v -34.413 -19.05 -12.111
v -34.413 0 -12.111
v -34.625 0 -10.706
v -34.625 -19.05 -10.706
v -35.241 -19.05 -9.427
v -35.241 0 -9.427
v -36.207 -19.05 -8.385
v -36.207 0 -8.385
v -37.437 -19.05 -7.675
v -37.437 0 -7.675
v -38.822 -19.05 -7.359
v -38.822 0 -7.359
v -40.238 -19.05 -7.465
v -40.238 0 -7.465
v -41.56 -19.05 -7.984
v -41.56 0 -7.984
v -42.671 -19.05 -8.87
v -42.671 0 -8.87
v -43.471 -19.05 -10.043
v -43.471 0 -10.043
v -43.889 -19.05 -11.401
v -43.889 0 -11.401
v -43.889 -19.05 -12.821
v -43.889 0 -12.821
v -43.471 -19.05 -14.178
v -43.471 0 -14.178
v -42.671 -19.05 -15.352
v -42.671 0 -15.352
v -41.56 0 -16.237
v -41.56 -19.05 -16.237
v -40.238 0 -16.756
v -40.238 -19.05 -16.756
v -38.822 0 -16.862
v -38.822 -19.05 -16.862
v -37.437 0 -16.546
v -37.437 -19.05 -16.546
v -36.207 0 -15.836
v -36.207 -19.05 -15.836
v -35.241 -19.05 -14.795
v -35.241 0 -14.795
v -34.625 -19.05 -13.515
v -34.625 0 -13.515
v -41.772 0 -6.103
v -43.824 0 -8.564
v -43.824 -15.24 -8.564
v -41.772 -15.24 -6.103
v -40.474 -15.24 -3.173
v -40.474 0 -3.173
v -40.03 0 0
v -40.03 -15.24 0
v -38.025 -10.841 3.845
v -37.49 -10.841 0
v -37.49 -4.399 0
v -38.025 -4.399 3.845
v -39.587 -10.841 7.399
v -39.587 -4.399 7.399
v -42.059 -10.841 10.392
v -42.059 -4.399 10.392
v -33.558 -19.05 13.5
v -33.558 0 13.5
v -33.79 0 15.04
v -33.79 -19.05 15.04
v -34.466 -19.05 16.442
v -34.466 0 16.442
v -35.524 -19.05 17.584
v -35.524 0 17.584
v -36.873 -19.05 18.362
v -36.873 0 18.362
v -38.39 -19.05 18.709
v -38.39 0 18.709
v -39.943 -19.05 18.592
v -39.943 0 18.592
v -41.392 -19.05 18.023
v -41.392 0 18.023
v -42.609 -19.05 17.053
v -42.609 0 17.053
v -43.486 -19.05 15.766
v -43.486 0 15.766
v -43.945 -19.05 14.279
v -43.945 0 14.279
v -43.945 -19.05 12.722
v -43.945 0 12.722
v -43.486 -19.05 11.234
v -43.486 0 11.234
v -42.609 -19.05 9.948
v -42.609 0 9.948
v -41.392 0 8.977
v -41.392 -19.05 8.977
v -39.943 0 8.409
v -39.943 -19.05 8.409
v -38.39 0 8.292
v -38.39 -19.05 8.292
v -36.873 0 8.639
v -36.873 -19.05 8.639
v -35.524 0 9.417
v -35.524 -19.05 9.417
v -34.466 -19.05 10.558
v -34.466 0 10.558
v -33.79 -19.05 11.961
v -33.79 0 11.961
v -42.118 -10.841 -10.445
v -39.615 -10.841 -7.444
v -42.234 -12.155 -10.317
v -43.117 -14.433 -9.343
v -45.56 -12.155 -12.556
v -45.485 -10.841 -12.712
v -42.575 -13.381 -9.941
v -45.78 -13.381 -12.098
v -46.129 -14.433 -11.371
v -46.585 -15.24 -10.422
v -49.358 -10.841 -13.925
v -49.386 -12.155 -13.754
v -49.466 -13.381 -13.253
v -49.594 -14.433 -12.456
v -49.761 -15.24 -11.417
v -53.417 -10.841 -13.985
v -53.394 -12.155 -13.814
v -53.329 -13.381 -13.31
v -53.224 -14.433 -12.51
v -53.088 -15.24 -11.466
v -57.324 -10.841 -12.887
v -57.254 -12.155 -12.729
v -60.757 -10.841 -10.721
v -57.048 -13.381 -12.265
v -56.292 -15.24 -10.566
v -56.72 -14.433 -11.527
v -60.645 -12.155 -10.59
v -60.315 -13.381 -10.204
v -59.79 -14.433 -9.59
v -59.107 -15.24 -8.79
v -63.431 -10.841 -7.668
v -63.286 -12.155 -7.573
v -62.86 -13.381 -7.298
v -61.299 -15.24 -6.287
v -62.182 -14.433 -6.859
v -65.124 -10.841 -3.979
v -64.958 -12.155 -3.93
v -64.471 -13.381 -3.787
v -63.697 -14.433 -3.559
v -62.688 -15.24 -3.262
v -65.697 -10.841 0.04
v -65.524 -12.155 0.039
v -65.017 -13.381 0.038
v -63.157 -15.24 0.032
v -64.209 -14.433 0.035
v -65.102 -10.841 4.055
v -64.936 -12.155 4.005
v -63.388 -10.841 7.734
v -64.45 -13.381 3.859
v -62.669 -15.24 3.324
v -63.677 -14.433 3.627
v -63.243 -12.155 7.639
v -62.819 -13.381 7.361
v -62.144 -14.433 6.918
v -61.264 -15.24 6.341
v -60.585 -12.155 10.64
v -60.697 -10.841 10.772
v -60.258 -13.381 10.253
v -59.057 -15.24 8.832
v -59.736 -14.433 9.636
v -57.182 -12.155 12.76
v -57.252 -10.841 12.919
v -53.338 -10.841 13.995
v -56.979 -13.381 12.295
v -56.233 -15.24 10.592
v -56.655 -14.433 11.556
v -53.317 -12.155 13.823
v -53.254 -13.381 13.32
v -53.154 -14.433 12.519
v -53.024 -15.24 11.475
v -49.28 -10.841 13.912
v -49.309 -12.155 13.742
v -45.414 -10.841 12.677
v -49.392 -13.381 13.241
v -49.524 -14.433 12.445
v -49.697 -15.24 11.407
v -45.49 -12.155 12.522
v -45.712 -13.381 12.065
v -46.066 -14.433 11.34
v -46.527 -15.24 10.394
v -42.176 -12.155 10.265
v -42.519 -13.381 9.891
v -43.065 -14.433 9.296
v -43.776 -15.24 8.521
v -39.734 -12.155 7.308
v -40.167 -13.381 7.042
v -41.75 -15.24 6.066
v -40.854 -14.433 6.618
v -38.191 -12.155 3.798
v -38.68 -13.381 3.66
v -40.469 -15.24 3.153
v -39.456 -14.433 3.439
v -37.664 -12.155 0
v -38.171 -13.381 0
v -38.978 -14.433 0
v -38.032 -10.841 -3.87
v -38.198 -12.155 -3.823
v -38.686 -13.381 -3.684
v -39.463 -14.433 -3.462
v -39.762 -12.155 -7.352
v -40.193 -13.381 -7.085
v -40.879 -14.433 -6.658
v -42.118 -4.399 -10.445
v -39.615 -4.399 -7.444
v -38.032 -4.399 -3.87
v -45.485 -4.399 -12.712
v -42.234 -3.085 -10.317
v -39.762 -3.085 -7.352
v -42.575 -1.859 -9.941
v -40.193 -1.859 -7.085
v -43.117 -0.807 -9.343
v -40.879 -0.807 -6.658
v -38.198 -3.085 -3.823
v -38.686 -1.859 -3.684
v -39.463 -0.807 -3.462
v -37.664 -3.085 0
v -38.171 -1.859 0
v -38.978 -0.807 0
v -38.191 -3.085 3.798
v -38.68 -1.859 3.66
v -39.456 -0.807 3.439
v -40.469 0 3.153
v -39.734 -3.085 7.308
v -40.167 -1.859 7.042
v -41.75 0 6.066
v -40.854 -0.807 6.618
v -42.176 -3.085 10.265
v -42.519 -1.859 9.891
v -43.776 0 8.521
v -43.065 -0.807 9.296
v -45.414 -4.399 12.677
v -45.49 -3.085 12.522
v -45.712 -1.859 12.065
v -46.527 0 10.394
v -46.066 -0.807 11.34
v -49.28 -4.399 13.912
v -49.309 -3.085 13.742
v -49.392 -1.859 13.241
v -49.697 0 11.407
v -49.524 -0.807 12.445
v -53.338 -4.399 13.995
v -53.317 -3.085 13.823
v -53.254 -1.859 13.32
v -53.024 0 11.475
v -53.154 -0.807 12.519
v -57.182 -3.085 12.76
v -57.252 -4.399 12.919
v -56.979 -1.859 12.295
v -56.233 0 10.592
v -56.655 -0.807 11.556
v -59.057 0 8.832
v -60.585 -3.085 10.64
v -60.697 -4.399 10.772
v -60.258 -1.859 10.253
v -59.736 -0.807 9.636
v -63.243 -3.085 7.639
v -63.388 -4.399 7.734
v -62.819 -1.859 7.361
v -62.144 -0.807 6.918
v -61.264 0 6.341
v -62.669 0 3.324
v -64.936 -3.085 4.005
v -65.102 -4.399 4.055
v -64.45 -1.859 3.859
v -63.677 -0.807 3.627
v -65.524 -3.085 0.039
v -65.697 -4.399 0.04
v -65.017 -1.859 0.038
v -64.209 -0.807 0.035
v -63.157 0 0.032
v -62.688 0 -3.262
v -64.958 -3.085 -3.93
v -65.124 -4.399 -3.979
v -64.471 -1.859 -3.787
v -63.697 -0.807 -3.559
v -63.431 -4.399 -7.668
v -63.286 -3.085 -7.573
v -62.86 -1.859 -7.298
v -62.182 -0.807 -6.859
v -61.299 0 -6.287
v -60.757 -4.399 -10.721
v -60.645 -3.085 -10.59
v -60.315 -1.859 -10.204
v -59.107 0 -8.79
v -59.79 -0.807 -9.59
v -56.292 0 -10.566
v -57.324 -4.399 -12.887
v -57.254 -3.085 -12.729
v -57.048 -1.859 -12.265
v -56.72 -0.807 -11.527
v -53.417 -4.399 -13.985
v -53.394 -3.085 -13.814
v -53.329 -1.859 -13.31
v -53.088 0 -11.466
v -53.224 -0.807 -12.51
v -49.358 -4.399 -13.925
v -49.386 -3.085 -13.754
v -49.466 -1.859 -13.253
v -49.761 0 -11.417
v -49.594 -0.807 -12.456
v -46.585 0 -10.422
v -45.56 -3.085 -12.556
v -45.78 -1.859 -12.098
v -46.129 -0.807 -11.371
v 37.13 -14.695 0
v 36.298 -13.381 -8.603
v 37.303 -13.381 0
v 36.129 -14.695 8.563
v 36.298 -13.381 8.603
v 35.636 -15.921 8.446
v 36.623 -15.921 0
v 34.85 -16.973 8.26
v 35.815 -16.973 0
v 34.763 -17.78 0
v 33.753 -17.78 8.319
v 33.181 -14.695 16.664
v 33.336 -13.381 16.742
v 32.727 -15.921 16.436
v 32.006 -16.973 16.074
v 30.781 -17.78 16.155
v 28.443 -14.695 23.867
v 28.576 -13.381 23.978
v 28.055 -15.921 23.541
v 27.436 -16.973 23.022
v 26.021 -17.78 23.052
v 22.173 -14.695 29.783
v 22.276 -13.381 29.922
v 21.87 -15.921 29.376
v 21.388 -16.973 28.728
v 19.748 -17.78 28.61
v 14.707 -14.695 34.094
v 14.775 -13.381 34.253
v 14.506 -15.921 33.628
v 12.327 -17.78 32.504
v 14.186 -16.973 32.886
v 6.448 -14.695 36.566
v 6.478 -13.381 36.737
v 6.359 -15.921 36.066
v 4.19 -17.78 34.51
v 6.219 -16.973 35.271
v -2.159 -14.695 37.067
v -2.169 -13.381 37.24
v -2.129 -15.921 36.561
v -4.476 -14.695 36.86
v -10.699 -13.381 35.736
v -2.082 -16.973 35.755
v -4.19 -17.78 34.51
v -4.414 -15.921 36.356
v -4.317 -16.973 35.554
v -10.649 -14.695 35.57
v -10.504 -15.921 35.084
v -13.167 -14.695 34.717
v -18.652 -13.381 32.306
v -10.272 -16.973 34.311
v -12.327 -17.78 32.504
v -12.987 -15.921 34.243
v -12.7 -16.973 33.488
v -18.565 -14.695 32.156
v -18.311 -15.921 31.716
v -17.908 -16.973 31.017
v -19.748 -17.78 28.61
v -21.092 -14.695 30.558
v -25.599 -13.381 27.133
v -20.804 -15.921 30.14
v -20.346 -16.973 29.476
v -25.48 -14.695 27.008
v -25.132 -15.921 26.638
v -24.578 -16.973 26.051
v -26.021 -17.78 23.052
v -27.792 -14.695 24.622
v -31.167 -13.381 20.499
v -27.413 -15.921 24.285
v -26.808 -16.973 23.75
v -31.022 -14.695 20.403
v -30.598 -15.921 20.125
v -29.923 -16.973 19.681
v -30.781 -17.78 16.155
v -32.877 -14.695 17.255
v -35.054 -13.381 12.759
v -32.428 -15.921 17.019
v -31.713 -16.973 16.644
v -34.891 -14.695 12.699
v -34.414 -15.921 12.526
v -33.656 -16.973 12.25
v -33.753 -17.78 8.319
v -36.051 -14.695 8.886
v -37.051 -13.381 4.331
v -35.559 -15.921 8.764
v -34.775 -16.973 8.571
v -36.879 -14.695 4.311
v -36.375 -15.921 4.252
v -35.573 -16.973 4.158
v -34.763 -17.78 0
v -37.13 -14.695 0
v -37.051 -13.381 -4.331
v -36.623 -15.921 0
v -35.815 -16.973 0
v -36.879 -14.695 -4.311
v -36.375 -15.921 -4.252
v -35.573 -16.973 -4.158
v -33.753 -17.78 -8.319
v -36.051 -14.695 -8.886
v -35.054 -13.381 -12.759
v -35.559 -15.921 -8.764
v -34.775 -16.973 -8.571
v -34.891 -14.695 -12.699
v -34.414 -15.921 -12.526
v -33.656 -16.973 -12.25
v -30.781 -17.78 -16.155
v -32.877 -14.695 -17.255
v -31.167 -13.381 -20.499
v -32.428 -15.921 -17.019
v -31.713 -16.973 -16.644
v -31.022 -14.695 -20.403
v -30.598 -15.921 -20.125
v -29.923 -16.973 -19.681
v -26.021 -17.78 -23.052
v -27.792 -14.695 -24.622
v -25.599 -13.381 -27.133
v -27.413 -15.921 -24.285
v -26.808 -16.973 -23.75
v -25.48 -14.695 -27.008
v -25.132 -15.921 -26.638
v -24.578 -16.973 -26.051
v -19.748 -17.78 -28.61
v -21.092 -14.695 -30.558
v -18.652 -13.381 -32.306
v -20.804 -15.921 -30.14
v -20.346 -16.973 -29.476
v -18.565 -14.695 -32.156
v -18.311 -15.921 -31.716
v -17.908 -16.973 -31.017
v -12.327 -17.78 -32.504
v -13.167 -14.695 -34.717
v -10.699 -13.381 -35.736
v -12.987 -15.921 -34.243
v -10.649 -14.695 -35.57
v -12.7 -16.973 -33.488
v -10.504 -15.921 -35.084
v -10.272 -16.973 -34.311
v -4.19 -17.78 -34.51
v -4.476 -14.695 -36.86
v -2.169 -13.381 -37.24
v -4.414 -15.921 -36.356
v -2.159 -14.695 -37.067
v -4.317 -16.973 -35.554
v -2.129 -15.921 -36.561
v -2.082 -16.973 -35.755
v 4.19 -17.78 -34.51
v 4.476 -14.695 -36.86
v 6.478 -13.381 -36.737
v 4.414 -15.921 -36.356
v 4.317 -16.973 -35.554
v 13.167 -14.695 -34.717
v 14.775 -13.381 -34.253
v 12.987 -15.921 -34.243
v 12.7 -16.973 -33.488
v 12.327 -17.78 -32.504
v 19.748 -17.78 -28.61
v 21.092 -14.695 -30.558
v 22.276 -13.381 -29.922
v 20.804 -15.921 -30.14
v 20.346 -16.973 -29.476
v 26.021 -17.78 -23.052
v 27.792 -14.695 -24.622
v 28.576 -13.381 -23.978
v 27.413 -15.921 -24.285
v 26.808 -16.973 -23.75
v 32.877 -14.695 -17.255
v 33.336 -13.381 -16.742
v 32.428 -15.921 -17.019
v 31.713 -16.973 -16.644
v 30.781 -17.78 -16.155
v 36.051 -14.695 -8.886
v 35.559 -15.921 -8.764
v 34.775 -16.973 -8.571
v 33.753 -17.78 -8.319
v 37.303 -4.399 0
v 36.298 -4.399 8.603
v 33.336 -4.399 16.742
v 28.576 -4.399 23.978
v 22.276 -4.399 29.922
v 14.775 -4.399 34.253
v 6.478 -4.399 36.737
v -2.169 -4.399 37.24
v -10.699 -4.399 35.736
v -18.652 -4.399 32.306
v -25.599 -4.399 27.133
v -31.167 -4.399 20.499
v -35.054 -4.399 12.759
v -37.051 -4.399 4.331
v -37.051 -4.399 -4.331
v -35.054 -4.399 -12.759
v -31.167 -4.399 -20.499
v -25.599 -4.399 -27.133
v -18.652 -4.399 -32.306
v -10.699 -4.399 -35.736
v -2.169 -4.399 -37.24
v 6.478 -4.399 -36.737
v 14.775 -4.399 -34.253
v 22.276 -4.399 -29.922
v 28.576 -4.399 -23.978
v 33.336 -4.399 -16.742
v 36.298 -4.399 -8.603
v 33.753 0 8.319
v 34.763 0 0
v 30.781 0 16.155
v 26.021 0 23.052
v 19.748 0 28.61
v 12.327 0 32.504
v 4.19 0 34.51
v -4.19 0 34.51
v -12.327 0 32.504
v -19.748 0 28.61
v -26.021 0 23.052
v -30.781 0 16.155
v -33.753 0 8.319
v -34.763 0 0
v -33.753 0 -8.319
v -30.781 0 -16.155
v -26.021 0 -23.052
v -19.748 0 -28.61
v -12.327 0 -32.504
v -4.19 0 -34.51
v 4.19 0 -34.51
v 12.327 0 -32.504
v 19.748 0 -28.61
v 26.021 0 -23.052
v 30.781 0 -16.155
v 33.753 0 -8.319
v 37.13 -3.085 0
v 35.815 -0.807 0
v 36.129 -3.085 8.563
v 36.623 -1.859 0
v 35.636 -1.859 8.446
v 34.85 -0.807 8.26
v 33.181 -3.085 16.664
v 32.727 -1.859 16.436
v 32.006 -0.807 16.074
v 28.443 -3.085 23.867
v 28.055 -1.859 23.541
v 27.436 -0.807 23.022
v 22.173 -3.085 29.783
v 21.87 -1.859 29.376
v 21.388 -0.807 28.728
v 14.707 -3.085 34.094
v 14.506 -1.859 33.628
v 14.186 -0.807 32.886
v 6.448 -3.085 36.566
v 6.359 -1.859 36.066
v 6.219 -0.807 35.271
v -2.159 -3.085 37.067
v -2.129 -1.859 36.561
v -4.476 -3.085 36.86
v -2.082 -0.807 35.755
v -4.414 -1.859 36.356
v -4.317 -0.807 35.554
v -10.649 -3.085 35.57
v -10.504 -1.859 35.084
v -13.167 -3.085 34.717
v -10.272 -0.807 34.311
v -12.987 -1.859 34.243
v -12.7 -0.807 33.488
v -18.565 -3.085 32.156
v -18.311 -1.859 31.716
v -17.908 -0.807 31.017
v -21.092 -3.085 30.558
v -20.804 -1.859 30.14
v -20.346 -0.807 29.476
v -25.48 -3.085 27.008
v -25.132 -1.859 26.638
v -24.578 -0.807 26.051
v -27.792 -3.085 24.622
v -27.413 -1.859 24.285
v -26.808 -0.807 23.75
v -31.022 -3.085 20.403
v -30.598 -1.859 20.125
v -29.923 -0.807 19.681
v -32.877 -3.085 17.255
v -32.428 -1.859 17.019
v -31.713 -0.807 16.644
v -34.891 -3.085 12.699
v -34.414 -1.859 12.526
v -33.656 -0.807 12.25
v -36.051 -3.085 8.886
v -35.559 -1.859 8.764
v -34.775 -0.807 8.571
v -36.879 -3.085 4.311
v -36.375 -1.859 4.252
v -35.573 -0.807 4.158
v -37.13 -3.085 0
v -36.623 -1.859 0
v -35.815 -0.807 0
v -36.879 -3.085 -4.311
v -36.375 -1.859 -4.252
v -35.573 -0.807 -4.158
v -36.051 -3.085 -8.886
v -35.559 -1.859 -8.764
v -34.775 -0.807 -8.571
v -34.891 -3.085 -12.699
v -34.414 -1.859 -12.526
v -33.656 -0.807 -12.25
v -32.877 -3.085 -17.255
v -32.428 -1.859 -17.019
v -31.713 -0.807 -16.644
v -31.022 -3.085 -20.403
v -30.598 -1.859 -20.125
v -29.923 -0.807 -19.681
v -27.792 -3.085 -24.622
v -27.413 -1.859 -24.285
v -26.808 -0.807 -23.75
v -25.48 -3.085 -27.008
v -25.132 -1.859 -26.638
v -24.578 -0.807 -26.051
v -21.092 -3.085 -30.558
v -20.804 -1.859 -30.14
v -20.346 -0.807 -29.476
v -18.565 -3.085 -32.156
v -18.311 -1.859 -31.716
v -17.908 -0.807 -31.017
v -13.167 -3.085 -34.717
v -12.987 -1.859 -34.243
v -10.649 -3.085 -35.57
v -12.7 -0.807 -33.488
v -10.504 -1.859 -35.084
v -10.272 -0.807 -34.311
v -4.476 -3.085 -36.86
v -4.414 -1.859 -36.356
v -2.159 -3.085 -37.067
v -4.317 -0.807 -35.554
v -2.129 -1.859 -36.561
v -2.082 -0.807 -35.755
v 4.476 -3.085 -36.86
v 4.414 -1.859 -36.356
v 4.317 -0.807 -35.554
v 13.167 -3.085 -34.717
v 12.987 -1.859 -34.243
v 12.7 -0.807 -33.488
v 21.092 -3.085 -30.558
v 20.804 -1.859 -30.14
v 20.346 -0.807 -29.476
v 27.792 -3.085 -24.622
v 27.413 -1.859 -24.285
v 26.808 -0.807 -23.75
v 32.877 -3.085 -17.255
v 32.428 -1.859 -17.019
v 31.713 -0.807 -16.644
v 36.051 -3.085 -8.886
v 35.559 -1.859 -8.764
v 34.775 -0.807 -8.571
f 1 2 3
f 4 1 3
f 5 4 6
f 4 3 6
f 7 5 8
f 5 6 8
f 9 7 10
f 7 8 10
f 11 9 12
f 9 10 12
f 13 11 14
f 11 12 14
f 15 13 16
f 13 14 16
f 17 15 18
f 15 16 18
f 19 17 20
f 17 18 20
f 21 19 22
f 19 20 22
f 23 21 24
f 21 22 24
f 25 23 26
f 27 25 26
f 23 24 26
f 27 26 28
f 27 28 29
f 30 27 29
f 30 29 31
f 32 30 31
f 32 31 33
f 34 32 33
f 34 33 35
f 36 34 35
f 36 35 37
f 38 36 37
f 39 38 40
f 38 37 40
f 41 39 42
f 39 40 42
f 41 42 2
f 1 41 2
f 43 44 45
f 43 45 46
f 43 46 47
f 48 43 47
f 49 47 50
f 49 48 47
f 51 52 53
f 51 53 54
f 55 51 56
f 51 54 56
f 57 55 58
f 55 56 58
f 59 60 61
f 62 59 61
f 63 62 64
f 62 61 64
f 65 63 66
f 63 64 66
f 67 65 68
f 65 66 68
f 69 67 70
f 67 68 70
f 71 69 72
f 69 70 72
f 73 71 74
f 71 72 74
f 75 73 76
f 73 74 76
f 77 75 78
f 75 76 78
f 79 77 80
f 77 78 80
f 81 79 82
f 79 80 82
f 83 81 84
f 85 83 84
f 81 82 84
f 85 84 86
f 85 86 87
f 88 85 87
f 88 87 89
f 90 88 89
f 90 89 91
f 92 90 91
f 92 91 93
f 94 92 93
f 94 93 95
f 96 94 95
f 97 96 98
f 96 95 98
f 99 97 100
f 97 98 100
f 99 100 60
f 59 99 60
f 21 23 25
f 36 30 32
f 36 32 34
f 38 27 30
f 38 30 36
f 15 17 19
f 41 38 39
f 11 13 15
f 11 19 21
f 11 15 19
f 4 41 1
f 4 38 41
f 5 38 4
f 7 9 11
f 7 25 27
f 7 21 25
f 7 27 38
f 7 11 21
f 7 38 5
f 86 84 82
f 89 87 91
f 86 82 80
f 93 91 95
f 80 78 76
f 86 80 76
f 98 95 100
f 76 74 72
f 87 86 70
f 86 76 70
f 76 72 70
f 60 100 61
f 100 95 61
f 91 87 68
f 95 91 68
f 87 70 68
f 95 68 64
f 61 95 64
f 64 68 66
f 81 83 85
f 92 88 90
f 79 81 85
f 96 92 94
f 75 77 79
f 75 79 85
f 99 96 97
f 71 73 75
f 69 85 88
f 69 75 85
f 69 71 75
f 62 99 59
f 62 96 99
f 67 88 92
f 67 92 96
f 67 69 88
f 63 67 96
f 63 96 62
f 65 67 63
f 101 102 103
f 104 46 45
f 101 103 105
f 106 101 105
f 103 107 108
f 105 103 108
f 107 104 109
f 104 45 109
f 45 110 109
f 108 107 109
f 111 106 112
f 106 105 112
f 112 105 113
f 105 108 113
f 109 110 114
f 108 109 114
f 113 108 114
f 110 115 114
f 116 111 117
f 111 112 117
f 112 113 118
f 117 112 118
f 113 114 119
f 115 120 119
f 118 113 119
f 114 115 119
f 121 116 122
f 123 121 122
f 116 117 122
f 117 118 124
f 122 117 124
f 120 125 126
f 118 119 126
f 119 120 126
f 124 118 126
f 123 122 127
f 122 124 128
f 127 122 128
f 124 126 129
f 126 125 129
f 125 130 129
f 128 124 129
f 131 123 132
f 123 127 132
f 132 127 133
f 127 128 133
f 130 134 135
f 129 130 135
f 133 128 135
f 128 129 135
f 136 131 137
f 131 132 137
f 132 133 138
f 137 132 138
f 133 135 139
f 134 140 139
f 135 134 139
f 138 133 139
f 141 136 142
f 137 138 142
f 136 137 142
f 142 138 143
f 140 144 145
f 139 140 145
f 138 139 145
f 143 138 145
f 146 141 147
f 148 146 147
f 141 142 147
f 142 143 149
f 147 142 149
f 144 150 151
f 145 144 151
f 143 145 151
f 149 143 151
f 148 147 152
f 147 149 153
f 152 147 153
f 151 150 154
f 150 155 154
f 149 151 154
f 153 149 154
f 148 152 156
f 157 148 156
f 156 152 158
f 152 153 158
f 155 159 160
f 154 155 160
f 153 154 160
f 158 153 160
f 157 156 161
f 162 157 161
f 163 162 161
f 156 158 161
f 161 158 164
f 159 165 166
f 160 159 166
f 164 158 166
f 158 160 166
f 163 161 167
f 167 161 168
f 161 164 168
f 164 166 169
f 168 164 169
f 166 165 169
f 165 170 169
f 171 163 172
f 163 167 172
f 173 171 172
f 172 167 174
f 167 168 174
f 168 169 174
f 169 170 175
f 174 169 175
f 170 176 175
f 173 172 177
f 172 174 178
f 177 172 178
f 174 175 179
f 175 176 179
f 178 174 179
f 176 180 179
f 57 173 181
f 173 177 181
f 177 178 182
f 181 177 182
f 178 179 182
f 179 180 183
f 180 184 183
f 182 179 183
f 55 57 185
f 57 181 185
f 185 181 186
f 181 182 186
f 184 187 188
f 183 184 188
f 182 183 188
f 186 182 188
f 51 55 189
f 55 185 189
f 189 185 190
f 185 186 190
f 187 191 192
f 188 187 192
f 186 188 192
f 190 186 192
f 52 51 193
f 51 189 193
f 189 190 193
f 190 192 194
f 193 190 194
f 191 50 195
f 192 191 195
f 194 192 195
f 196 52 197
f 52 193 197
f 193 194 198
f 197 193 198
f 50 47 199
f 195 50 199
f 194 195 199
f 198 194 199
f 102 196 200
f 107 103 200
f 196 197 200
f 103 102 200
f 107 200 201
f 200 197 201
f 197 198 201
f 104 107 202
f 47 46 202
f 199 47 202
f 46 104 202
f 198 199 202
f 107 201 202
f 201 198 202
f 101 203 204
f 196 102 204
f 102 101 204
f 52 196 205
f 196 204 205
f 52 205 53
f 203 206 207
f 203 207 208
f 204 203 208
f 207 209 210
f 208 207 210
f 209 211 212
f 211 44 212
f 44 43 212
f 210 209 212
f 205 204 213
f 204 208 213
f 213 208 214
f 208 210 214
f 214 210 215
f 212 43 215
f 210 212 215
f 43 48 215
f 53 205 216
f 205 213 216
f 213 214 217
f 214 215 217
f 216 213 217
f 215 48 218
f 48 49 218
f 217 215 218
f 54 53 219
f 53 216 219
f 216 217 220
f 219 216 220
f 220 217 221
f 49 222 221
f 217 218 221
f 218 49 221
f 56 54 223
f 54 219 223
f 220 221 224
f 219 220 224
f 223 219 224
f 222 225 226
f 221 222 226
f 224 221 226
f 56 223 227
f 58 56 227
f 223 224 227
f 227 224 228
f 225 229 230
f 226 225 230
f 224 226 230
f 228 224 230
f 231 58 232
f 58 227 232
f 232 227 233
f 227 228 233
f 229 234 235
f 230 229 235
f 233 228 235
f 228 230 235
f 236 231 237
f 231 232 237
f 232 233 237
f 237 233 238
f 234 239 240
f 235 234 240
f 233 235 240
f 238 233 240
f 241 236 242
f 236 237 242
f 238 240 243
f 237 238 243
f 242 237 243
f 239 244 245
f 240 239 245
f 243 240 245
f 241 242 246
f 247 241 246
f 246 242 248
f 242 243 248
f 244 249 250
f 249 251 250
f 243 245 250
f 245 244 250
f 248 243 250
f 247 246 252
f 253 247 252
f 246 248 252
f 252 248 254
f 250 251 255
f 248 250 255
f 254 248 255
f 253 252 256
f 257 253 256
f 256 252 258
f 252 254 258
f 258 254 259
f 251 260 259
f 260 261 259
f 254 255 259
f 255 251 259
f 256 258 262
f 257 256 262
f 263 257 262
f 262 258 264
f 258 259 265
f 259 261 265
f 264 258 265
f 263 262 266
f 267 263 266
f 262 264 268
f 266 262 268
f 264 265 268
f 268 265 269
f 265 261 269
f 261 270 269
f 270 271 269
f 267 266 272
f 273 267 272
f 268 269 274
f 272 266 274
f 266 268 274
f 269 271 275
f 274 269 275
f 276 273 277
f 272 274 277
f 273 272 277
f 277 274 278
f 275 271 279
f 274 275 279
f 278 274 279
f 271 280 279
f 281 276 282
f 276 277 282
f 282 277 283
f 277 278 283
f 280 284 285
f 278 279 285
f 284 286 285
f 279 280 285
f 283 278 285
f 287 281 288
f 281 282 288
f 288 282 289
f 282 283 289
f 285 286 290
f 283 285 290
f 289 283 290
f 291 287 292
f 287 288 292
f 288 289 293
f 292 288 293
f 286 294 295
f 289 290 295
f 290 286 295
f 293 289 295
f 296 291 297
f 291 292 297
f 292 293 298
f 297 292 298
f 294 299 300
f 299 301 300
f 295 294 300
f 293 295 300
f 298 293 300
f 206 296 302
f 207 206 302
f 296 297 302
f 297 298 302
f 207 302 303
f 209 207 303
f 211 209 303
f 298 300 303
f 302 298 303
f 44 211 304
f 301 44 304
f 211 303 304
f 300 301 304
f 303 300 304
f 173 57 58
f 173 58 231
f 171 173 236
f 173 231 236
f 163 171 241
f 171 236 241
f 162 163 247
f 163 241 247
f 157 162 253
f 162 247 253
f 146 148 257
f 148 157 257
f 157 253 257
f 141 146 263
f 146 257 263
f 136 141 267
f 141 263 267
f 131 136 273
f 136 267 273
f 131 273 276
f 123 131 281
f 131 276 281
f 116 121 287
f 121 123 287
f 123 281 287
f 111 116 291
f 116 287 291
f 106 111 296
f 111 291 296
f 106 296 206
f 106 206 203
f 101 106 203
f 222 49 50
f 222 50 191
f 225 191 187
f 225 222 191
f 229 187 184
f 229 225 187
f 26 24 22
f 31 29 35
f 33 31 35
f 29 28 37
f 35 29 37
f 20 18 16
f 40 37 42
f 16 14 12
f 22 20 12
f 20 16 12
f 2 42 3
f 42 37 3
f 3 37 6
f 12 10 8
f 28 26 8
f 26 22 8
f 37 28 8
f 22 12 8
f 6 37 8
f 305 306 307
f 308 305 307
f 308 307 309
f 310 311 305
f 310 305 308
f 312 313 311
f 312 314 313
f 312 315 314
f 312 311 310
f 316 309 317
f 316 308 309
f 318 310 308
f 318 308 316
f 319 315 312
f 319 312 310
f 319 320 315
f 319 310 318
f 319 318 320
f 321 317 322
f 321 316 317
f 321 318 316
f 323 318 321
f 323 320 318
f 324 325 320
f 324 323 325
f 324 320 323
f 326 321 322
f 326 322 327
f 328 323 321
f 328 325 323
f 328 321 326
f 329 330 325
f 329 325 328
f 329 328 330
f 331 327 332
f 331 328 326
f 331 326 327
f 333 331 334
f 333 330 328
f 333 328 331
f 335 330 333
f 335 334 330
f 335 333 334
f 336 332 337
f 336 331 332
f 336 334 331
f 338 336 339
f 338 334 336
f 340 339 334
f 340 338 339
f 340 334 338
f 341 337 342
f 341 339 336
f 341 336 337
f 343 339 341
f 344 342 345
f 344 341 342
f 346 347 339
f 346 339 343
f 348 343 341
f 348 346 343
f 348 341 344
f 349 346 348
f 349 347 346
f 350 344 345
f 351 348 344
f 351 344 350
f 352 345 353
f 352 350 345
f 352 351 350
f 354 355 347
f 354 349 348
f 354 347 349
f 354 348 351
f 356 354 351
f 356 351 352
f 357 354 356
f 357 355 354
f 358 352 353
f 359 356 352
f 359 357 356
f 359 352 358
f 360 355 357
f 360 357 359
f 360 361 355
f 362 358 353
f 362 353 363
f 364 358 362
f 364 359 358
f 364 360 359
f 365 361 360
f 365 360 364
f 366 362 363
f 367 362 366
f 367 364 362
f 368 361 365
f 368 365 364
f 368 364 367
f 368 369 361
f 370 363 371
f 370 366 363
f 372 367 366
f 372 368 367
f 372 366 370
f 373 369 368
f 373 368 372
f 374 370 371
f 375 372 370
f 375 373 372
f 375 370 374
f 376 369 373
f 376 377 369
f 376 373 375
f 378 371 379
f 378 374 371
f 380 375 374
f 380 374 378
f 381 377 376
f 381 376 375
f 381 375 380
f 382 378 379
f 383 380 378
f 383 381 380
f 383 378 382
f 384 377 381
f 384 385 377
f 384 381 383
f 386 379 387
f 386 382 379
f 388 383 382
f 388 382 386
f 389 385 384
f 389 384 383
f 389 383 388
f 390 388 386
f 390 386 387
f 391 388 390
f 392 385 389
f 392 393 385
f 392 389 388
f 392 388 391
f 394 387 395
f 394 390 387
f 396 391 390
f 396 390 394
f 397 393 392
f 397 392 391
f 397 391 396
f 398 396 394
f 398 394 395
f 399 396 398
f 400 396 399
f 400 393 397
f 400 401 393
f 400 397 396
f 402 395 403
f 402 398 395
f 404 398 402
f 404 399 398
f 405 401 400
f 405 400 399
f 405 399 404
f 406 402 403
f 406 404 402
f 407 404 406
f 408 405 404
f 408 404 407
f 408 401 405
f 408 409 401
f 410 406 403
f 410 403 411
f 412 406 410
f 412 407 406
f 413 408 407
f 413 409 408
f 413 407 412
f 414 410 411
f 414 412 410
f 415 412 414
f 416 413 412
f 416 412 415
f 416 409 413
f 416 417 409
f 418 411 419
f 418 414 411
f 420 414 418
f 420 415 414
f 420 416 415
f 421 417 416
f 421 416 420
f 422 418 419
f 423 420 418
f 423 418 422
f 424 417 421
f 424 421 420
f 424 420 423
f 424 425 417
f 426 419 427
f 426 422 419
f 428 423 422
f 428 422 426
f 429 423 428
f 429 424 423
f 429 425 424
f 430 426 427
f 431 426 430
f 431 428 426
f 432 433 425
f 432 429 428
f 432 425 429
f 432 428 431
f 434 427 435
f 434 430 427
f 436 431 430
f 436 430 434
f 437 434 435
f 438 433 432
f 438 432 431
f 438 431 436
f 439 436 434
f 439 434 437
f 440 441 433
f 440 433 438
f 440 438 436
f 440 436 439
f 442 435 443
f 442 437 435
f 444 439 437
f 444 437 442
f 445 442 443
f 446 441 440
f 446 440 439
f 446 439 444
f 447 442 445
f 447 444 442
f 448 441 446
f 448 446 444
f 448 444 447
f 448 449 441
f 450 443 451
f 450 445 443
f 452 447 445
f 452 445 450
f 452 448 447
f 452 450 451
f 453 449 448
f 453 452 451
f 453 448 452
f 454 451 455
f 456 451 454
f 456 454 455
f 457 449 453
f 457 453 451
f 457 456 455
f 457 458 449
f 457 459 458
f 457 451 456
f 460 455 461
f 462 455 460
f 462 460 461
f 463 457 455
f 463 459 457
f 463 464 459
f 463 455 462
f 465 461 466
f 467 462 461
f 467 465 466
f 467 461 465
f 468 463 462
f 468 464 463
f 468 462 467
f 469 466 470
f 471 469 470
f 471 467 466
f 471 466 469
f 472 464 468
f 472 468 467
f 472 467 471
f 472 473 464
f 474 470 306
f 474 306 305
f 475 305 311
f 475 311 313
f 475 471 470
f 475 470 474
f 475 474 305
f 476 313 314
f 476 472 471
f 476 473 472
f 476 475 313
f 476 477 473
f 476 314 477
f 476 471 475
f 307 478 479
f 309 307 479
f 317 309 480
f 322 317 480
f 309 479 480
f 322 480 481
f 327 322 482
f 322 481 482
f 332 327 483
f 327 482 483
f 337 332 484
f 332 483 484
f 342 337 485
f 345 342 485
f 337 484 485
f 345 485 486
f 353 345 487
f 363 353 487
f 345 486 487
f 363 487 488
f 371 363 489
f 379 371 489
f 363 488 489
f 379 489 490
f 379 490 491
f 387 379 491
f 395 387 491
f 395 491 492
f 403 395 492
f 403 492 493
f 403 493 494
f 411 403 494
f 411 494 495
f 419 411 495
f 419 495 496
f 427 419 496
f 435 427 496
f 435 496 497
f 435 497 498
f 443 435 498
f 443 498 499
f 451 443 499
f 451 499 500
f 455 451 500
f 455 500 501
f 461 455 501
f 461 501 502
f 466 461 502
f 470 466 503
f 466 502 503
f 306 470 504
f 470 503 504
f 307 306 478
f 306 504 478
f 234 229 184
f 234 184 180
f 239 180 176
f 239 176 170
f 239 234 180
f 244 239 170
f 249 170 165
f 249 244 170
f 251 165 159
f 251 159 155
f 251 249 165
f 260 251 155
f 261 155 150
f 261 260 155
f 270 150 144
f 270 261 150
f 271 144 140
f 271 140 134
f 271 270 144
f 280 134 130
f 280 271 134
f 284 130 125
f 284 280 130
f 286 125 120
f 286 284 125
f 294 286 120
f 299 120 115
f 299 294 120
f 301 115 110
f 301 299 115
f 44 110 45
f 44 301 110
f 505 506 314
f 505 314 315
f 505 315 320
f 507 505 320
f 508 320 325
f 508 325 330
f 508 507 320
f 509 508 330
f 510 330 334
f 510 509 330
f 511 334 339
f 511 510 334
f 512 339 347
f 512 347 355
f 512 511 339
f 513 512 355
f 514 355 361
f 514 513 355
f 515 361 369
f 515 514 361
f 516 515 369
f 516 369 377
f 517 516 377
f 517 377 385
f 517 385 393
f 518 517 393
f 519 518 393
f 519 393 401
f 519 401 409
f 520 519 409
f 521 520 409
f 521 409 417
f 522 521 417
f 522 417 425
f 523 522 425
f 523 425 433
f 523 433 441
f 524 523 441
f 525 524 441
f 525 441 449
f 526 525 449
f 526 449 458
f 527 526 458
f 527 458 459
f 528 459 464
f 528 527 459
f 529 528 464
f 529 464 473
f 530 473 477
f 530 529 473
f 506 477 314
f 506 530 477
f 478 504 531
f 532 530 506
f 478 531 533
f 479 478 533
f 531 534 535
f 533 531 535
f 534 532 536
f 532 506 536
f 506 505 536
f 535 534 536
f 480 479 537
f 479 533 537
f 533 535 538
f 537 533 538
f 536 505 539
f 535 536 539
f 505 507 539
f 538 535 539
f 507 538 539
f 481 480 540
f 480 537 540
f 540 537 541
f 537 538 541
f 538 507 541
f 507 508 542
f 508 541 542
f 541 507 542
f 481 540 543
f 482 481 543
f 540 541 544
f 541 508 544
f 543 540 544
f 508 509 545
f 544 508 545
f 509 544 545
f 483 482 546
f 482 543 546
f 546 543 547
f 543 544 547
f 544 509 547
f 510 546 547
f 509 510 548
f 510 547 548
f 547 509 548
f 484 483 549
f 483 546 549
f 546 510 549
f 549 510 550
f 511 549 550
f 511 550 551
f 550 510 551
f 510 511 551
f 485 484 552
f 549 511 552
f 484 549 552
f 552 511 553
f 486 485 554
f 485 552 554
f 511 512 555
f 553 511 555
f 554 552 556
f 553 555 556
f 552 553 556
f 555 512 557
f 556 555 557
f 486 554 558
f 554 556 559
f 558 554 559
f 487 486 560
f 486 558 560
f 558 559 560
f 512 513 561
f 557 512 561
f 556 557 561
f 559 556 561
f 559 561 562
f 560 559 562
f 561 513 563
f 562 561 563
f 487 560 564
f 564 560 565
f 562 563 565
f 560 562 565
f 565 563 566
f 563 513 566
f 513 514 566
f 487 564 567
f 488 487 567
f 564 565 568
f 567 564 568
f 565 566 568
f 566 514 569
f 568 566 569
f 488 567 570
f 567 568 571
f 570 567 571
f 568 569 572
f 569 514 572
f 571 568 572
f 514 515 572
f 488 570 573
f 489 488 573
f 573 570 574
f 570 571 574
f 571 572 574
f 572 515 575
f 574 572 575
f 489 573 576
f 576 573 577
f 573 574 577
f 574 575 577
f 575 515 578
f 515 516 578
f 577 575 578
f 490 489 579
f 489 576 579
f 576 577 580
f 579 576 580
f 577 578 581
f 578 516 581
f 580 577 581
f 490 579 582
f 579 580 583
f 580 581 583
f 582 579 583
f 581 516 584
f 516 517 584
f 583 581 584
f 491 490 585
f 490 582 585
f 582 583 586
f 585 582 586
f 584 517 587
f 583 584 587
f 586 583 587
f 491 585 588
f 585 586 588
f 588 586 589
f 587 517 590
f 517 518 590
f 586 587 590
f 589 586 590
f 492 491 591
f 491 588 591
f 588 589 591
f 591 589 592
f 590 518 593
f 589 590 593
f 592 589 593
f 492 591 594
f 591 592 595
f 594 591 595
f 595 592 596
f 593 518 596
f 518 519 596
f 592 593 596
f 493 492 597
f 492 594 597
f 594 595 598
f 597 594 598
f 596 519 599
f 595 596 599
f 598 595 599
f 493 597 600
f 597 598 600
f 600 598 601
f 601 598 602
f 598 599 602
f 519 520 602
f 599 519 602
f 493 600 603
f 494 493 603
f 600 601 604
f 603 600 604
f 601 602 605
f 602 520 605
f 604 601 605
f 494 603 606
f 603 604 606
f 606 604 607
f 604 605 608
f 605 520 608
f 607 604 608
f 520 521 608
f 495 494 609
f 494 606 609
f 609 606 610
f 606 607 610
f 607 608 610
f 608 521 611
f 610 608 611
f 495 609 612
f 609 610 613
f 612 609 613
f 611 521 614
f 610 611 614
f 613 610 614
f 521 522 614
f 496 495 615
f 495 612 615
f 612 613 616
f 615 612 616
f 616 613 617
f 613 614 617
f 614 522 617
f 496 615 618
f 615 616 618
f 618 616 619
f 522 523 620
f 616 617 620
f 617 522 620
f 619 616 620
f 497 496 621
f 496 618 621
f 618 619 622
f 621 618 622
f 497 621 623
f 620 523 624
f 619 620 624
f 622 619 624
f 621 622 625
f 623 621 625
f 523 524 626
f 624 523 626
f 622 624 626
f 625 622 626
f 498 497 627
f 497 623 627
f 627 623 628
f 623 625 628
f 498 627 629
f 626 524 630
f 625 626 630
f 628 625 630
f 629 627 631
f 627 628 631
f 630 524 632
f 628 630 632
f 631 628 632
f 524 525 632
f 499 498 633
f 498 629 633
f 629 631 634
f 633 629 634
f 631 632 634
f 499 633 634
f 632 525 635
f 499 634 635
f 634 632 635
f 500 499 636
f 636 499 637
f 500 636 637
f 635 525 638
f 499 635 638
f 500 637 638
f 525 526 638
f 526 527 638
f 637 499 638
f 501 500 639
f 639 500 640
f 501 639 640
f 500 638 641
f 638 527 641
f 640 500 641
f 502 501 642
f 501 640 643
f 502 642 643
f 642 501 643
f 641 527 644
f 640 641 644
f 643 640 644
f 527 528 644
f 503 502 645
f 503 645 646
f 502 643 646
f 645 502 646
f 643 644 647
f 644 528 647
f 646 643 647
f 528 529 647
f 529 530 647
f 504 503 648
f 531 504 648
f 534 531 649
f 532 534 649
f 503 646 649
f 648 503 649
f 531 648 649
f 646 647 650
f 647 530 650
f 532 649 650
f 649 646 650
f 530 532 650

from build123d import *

# Parameters (mm, degrees)
F0_R     = 37.3033746103
F1_DEPTH = 17.78
F3_DEPTH = 15.24
F4_T     = -2.54
F6_R     = 5.22266797
F7_DEPTH = 19.05
F6_R_2   = 4.7648660839
F8_T     = -2.54


# Not quite as in the source:
# - a fillet or chamfer that OpenCascade refuses, or shapes differently, is made with other operations: its cross-section is extruded or revolved along the edge and cut away or added


with BuildPart() as f1:
    # F0 (on Front) → F1 (new body)
    with BuildSketch(Plane.XZ):
        Circle(F0_R)
    extrude(amount=F1_DEPTH)

    # F8
    f8_openings = [f1.faces().sort_by_distance(p)[0] for p in [
        (0, -17.78, 0),
        (0, 0, 0),
    ]]
    offset(amount=F8_T, openings=f8_openings)

    # F9: fillet of radius 5.08 on 2 edges, made by hand

    # F9_s1 → F9_t2 (revolve, cut)
    with BuildSketch(Plane.XY):
        with BuildLine():
            ThreePointArc((37.3033746103, -4.3994090512), (36.6227836615, -1.8594090512), (34.7633746103, 0))
            Line((34.7633746103, 0), (37.3033746103, 0))
            Line((37.3033746103, 0), (37.3033746103, -4.3994090512))
        make_face()
    revolve(axis=Axis((0, 0, 0), (0, -1, 0)), mode=Mode.SUBTRACT)

    # F9_s3 → F9_t4 (revolve, cut)
    with BuildSketch(Plane.XY):
        with BuildLine():
            ThreePointArc((37.3033746103, -13.3805909488), (36.6227836615, -15.9205909488), (34.7633746103, -17.78))
            Line((34.7633746103, -17.78), (37.3033746103, -17.78))
            Line((37.3033746103, -17.78), (37.3033746103, -13.3805909488))
        make_face()
    revolve(axis=Axis((0, -17.78, 0), (0, -1, 0)), mode=Mode.SUBTRACT)


with BuildPart() as f3:
    # F2 (on Front) → F3 (new body)
    with BuildSketch(Plane.XZ):
        with BuildLine():
            ThreePointArc((-42.1175740598, -10.4453951378), (-38.6990169823, -5.7121912273), (-37.490454558, 0))
            ThreePointArc((-37.490454558, 0), (-38.6830691319, 5.6760535089), (-42.059213055, 10.3921498998))
            ThreePointArc((-42.059213055, 10.3921498998), (-65.6972597782, 0.039500197), (-42.1175740598, -10.4453951378))
        make_face()
    extrude(amount=F3_DEPTH)

    # F4
    f4_openings = [f3.faces().sort_by_distance(p)[0] for p in [
        (-51.593885, -15.24, 0),
        (-51.593885, 0, 0),
    ]]
    offset(amount=F4_T, openings=f4_openings)

    # F5: fillet of radius 5.08 on 2 edges, made by hand

    # F5_s1 → F5_t2 (revolve, cut)
    with BuildSketch(Plane(origin=(-28.300783936, 0, -25.6751439232), x_dir=(0, 1, 0), z_dir=(-0.7406279848, 0, -0.6719153132))):
        with BuildLine():
            ThreePointArc((-4.3994090512, -20.5632910156), (-1.8594090512, -21.2438819644), (0, -23.1032910156))
            Line((0, -23.1032910156), (0, -20.5632910156))
            Line((0, -20.5632910156), (-4.3994090512, -20.5632910156))
        make_face()
    revolve(axis=Axis((-51.5938848257, 0, 0), (0, -1, 0)), mode=Mode.SUBTRACT)

    # F5_s3 → F5_t4 (revolve, cut)
    with BuildSketch(Plane(origin=(-28.300783936, 0, -25.6751439232), x_dir=(0, 1, 0), z_dir=(0.7406279848, 0, 0.6719153132))):
        with BuildLine():
            ThreePointArc((-10.8405909488, 20.5632910156), (-13.3805909488, 21.2438819644), (-15.24, 23.1032910156))
            Line((-15.24, 23.1032910156), (-15.24, 20.5632910156))
            Line((-15.24, 20.5632910156), (-10.8405909488, 20.5632910156))
        make_face()
    revolve(axis=Axis((-51.5938848257, -15.24, 0), (0, 1, 0)), mode=Mode.SUBTRACT)


with BuildPart() as f7:
    # F6 (on Front) → F7 (new body)
    with BuildSketch(Plane.XZ):
        with Locations((-38.7806966901, 13.5004464537)):
            Circle(F6_R)
    extrude(amount=F7_DEPTH)


with BuildPart() as f7b:
    # F6 (on Front) → F7, piece 2 (new body)
    with BuildSketch(Plane.XZ):
        with Locations((-39.1777679324, -12.1106943116)):
            Circle(F6_R_2)
    extrude(amount=F7_DEPTH)


solid = Compound([f1.part, f3.part, f7.part, f7b.part])
